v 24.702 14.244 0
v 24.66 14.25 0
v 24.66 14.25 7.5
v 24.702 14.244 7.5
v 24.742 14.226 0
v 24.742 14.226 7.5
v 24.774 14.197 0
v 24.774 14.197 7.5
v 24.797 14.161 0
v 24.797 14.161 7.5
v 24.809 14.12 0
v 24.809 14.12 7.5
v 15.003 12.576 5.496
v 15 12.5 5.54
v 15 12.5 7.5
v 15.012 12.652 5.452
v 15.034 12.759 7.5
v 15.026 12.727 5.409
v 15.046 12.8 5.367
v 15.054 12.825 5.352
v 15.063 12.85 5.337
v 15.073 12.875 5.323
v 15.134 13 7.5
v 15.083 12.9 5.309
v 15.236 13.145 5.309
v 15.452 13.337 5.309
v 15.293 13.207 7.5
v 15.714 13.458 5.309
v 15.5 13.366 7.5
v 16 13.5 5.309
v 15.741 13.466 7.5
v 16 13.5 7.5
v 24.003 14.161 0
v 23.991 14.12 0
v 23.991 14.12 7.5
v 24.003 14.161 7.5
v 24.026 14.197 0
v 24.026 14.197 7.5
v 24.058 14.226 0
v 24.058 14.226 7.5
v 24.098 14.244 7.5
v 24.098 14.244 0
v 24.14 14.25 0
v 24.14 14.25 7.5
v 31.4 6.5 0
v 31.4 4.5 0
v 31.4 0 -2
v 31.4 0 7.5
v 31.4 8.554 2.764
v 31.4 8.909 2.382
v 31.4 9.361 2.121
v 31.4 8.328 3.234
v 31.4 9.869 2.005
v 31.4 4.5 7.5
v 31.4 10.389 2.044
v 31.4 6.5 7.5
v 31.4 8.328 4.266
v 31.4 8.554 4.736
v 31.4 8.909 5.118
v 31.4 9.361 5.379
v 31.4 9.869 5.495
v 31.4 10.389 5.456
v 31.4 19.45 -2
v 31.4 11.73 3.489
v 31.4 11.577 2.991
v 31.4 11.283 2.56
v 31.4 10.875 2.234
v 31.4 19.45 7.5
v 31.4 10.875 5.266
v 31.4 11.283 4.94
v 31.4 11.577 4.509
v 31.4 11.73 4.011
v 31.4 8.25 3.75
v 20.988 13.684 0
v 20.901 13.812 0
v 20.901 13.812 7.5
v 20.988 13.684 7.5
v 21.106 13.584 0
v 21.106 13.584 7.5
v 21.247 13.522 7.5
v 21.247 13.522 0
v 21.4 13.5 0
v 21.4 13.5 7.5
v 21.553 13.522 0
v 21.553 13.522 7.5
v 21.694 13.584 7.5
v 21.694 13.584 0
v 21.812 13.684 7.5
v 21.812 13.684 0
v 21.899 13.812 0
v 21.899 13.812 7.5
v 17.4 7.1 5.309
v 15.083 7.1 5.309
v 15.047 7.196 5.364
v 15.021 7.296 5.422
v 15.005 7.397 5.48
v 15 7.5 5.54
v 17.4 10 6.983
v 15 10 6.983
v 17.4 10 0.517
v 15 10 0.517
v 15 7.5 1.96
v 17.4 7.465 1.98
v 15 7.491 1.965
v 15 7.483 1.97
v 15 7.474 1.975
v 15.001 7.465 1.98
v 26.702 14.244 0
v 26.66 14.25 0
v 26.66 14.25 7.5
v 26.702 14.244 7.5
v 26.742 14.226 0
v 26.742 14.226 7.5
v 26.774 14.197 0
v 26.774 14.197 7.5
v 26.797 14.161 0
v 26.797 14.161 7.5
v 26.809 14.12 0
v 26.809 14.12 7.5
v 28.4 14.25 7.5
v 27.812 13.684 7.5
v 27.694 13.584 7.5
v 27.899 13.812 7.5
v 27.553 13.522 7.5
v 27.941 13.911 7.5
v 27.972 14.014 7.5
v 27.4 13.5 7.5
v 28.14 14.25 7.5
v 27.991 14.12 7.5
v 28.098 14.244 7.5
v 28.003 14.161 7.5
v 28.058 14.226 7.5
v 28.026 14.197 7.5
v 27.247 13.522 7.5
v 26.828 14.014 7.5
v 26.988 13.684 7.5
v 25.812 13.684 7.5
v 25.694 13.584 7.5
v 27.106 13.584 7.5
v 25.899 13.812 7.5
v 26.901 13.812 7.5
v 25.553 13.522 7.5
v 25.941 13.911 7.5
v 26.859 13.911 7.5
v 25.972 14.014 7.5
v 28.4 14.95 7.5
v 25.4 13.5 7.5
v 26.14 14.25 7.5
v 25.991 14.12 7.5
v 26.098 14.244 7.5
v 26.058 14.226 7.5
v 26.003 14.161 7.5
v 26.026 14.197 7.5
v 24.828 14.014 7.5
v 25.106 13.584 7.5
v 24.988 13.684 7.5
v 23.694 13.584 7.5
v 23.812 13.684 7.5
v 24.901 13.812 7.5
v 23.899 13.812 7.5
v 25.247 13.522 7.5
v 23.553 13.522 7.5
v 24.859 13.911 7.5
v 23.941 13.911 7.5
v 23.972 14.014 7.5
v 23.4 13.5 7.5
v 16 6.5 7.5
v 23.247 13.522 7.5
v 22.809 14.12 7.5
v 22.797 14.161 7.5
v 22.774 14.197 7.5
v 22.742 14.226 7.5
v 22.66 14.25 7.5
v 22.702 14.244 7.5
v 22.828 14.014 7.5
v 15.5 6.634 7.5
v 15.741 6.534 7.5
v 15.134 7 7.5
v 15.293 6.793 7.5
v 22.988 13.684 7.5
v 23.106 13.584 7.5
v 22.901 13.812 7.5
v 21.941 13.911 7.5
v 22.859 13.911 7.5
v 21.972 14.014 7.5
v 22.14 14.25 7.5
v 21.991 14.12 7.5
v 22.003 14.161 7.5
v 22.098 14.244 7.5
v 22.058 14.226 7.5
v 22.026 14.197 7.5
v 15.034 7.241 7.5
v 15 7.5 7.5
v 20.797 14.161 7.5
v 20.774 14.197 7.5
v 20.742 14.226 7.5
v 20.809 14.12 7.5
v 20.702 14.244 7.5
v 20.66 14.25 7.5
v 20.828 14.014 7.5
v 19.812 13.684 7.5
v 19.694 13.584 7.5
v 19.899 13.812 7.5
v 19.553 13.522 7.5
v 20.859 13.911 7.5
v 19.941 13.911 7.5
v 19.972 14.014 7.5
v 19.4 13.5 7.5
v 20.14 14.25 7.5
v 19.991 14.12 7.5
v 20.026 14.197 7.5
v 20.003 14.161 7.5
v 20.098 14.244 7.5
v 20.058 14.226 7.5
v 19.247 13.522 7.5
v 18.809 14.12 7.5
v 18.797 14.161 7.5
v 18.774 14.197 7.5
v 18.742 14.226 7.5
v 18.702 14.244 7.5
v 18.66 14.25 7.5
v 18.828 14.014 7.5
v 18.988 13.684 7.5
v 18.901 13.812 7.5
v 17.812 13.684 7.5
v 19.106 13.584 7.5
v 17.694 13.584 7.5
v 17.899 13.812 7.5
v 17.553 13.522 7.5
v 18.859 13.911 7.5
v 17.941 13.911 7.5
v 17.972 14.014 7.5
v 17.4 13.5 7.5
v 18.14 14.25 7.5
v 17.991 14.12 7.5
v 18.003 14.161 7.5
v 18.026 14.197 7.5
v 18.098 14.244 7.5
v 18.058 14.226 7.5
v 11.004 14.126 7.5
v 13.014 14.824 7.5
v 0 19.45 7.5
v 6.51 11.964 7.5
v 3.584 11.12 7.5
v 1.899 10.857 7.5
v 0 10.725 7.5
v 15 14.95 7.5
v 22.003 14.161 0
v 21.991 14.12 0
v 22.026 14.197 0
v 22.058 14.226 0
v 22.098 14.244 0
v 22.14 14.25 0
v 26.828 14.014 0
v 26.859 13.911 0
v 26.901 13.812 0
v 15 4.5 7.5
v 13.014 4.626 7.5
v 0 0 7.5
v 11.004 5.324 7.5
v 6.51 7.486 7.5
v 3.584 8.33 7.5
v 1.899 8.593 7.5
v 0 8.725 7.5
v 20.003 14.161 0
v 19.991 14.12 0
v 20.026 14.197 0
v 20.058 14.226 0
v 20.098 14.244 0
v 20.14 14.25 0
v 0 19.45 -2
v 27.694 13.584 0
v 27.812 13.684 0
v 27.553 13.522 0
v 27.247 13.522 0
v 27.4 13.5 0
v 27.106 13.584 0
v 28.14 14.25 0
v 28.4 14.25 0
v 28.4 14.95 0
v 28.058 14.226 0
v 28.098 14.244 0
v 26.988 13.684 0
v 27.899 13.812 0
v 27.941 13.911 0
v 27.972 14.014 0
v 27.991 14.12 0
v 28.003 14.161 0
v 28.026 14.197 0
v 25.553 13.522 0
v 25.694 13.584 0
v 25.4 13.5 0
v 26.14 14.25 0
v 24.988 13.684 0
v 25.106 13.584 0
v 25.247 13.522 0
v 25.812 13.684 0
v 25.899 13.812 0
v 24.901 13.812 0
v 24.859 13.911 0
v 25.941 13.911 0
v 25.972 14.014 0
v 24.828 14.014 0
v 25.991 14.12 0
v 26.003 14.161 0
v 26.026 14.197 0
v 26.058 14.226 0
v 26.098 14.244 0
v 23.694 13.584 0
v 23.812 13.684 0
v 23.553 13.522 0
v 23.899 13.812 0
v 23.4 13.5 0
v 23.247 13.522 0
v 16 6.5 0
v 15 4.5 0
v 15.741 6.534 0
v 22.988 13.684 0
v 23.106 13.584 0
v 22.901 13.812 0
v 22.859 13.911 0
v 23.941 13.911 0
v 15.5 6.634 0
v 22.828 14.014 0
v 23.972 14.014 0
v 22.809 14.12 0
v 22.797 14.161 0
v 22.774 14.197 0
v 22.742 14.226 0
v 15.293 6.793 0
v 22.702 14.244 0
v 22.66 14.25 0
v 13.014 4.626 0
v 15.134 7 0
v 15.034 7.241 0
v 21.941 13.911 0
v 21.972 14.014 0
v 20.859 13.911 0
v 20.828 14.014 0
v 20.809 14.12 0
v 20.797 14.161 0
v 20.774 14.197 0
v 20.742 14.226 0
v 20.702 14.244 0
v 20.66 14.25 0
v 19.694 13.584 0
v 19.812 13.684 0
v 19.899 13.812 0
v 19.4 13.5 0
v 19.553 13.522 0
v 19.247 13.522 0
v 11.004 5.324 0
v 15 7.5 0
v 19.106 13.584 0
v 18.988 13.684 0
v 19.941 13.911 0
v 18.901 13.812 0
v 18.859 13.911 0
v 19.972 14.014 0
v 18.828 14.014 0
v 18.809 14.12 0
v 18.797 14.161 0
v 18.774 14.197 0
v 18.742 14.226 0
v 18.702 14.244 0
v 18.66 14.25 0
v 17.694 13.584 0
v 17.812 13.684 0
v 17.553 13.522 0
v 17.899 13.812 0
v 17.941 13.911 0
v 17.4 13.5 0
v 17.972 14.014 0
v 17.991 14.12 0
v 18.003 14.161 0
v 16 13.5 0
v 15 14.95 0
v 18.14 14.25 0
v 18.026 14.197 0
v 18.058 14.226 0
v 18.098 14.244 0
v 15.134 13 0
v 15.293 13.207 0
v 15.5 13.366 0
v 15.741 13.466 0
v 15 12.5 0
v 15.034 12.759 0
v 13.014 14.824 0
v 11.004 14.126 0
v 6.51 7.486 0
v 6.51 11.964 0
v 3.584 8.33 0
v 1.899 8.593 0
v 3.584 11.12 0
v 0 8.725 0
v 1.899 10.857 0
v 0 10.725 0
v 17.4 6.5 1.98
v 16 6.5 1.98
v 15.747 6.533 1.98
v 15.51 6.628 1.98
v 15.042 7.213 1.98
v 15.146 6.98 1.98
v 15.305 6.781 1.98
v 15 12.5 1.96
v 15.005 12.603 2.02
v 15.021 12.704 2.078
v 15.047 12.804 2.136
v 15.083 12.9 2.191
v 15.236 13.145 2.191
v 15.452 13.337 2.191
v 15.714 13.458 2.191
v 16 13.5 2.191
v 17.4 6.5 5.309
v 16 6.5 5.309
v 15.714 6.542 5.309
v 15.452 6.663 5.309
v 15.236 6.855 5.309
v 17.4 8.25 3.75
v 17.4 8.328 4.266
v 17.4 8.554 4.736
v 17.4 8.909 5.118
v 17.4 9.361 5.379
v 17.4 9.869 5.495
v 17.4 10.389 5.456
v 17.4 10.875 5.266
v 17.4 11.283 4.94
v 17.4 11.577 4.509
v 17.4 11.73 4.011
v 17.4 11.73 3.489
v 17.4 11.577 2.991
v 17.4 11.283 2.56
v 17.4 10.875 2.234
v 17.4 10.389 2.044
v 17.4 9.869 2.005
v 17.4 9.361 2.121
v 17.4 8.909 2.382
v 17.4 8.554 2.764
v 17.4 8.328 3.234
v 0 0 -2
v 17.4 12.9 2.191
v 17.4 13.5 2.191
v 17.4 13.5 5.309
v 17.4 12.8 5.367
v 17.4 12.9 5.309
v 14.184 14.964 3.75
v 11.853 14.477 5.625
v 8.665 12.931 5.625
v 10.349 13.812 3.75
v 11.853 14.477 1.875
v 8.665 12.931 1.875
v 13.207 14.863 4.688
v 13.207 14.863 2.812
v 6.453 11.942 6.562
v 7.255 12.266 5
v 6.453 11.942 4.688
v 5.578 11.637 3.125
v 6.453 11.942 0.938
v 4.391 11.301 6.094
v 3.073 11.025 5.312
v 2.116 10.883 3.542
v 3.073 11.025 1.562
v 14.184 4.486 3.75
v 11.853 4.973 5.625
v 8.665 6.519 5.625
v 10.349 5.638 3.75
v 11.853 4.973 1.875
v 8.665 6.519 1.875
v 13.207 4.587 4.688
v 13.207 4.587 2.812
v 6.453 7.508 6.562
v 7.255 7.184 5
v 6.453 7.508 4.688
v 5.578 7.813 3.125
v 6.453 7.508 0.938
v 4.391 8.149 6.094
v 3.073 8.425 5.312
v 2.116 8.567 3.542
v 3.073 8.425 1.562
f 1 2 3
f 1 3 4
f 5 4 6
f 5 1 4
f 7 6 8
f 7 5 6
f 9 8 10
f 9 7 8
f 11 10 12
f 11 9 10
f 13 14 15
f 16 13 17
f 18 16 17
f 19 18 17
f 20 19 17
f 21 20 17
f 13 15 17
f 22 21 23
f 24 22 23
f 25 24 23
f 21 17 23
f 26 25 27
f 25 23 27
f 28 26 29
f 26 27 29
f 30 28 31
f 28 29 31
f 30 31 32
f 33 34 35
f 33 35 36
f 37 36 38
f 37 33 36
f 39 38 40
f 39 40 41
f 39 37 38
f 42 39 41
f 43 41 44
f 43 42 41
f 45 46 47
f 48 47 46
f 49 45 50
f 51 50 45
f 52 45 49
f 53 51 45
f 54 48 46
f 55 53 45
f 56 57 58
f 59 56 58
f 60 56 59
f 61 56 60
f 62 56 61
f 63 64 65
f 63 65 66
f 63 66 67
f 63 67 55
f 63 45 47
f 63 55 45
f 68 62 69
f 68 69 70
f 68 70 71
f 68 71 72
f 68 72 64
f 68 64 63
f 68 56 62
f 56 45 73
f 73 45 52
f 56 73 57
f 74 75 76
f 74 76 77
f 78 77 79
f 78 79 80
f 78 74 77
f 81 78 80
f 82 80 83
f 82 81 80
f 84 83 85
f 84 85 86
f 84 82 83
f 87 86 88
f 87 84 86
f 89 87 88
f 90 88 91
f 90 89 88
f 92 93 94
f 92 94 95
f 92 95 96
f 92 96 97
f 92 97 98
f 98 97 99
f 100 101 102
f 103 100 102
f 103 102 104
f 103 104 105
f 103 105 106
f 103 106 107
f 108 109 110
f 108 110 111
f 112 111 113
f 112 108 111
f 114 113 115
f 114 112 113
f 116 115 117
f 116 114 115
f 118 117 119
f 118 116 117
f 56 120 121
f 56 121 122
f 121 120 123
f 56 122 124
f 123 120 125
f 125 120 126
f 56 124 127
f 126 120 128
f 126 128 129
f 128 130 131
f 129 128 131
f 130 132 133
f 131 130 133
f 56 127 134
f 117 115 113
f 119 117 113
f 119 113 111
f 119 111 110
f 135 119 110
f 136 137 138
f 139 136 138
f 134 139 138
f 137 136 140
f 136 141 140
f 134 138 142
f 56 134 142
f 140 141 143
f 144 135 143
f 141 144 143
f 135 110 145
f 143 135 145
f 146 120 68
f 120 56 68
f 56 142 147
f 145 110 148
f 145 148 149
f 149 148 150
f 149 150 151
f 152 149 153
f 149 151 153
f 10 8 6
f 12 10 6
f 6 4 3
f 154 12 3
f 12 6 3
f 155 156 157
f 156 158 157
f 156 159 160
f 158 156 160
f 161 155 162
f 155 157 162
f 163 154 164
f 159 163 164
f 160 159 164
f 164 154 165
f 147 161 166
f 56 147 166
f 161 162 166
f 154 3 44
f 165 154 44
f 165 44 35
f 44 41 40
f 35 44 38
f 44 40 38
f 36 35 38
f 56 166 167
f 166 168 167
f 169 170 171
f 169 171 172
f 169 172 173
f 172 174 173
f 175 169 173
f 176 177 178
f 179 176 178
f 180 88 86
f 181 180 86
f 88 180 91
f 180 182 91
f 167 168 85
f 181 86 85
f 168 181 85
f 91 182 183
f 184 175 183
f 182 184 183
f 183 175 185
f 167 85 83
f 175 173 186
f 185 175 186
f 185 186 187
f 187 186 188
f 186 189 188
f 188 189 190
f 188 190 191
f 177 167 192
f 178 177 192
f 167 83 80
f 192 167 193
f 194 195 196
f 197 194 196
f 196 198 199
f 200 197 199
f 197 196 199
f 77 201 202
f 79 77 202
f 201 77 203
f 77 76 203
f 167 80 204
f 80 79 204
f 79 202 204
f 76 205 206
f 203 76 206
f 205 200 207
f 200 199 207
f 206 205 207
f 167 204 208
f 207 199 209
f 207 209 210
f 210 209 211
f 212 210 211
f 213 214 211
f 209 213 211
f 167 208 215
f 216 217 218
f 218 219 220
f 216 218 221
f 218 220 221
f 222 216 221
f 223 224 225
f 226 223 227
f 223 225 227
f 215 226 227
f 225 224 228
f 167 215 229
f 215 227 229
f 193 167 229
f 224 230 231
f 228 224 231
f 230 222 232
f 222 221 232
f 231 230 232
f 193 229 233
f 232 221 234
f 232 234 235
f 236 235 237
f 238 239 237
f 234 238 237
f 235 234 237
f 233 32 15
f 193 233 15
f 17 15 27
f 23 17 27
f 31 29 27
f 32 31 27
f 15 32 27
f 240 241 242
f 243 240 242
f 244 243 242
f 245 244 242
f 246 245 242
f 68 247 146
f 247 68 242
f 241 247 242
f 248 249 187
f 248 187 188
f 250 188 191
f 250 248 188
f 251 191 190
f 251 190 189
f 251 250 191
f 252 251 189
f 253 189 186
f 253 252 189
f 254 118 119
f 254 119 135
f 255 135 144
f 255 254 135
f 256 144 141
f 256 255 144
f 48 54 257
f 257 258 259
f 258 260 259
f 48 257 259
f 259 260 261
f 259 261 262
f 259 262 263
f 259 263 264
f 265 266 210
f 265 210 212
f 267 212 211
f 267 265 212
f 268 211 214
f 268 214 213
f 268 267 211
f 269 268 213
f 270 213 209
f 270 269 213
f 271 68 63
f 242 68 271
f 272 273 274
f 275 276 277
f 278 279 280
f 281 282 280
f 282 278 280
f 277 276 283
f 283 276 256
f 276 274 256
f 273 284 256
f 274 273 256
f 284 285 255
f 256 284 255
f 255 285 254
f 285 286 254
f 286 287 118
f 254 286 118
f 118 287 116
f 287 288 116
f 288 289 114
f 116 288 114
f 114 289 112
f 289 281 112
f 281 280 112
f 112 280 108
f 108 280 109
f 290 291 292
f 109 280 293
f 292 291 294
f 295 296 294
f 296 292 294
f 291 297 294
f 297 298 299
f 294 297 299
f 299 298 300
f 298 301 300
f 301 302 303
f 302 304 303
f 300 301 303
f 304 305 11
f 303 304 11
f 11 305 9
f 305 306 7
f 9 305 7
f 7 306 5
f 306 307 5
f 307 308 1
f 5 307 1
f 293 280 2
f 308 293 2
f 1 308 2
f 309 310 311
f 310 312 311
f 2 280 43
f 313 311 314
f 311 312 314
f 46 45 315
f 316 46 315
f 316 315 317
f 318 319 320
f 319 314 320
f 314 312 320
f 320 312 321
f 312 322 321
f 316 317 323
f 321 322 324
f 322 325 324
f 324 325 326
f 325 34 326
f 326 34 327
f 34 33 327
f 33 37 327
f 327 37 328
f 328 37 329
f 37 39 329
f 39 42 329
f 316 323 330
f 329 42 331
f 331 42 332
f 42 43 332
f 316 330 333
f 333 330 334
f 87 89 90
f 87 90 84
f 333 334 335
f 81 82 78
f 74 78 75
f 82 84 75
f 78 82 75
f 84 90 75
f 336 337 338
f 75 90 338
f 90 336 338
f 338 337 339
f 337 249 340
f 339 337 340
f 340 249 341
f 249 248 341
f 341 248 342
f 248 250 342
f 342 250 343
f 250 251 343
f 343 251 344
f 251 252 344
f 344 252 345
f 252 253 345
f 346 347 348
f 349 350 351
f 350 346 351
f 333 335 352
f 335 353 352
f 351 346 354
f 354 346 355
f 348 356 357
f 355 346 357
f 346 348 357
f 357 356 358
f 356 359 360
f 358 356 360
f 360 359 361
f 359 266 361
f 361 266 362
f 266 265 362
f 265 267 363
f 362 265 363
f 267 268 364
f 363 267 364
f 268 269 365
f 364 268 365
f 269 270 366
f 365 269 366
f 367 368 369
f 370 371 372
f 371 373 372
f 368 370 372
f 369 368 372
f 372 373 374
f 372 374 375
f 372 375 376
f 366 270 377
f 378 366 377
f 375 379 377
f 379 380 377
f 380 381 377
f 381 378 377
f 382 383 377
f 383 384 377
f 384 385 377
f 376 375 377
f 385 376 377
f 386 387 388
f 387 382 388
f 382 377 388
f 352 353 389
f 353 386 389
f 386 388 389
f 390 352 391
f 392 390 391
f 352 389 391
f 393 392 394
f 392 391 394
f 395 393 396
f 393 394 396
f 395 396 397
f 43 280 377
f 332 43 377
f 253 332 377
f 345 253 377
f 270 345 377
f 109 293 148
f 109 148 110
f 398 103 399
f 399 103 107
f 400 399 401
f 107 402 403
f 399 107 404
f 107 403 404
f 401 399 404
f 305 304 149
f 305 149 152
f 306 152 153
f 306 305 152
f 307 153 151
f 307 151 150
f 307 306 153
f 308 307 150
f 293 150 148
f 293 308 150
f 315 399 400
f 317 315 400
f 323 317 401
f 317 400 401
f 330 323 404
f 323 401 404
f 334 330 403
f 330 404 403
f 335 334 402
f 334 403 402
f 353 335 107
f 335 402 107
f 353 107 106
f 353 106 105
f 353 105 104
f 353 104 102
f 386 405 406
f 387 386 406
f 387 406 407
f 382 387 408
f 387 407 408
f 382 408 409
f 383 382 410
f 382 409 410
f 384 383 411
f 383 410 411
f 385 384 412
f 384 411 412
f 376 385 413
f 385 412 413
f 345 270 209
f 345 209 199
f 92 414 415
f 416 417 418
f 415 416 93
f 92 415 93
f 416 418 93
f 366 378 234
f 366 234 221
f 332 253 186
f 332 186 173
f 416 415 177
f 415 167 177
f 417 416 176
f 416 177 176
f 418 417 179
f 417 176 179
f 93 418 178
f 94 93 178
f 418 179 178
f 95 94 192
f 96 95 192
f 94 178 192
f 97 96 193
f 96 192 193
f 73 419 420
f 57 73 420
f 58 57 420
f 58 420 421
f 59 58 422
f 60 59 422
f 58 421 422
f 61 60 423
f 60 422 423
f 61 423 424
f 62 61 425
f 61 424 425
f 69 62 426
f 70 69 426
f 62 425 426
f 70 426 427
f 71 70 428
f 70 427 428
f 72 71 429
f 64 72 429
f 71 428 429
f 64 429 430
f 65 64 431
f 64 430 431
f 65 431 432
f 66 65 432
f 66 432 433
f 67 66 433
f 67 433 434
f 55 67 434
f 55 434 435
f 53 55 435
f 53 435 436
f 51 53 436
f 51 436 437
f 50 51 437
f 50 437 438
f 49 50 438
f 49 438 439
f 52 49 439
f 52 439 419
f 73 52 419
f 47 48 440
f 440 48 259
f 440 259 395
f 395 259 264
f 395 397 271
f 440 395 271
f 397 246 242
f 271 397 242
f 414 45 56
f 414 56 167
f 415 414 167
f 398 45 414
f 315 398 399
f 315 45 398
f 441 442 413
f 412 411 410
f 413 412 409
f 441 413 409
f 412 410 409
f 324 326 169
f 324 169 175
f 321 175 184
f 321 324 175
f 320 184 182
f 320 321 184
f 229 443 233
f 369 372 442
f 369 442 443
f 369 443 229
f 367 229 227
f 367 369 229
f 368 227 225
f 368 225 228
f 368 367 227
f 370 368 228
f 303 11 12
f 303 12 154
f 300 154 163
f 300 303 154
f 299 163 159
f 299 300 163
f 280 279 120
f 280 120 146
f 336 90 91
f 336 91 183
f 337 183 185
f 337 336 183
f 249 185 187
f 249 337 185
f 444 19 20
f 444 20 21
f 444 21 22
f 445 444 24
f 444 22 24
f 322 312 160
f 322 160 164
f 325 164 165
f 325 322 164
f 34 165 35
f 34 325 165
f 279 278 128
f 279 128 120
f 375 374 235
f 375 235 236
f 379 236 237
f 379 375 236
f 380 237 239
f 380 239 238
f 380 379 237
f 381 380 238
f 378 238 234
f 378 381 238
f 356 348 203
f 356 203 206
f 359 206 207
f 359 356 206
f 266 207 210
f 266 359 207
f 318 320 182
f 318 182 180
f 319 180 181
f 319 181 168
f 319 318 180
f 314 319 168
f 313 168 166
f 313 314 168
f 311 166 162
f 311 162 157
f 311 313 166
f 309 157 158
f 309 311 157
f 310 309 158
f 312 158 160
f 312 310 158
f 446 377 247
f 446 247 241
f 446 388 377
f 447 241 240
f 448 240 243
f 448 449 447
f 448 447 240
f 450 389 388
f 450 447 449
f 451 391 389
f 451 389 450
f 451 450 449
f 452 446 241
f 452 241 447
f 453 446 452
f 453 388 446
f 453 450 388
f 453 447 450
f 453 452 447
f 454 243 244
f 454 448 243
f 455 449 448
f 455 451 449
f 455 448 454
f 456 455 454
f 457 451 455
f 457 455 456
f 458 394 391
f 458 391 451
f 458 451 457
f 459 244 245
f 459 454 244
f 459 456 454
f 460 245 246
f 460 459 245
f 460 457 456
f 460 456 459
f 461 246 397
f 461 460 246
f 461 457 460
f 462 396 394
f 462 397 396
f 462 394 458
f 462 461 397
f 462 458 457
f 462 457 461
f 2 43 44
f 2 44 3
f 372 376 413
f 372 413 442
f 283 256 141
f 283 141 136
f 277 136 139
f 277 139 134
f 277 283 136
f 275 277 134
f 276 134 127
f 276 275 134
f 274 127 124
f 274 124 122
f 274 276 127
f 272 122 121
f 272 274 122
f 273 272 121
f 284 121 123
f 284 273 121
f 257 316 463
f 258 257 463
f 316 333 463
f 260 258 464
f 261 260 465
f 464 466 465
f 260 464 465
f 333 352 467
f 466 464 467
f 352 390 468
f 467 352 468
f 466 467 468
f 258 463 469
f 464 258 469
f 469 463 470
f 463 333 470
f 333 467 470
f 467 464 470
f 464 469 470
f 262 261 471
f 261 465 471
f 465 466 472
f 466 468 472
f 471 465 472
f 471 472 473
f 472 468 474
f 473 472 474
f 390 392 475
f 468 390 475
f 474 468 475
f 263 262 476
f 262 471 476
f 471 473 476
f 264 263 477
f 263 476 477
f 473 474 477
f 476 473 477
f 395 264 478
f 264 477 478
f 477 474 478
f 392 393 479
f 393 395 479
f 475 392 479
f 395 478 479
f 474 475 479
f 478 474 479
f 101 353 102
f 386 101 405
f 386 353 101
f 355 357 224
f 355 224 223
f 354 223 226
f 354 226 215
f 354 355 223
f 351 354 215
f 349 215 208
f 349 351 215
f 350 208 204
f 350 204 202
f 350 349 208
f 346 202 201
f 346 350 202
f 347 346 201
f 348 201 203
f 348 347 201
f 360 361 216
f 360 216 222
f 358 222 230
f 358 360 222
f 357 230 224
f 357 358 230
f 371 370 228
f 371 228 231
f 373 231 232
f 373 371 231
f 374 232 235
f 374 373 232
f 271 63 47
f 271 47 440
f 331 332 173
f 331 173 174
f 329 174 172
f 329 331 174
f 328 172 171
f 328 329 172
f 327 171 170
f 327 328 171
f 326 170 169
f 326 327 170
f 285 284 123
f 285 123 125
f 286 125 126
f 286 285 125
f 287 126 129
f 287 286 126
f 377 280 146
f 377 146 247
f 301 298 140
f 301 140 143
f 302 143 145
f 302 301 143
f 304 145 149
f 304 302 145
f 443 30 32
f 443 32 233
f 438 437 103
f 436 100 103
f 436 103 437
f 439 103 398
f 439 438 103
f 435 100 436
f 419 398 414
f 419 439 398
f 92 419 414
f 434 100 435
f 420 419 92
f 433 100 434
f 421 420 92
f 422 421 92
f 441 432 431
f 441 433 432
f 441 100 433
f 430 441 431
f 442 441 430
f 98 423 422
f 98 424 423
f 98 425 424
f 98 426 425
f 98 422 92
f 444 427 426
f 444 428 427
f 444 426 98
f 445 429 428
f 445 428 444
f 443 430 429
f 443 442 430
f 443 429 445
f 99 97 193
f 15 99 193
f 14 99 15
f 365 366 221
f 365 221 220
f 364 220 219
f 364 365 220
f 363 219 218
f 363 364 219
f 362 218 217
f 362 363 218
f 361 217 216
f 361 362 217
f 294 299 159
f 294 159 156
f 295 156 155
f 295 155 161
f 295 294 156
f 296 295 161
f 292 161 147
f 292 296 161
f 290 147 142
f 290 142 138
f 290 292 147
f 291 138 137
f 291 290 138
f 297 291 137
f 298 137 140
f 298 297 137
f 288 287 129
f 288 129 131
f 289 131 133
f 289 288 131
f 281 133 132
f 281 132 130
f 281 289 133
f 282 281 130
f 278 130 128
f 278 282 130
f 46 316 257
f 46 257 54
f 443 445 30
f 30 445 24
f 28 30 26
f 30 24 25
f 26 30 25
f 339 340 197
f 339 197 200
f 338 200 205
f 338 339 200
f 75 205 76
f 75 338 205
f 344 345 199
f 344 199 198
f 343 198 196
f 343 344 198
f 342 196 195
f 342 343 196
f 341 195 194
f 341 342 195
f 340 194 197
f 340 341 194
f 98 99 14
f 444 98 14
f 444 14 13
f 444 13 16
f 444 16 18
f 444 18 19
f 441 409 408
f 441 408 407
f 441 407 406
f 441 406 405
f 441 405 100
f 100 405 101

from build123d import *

# Parameters (mm, degrees)
ESTRUSIONE_ESTRUSIONE1_DEPTH   = 7.5
ESTRUSIONE_ESTRUSIONE1_2_DEPTH = 7.5
SCHIZZO2_W                     = 31.4
SCHIZZO2_H                     = 19.45
ESTRUSIONE_ESTRUSIONE2_DEPTH   = 2
TAGLIO_ESTRUSIONE3_DEPTH       = 2.4
SCHIZZO5_3_R                   = 1.75
TAGLIO_ESTRUSIONE4_DEPTH       = 27.523810222
RACCORDO1_R                    = 1


with BuildPart() as part:
    # Schizzo1 → Estrusione-Estrusione1 (new body)
    with BuildSketch(Plane.XY):
        with BuildLine():
            Line((31.4, 6.5), (31.4, 19.45))
            Line((31.4, 19.45), (0, 19.45))
            Line((0, 19.45), (0, 10.725))
            add(Edge.make_bspline(
                [(15, 14.95), (14.198625643, 14.95), (12.206107526, 15.352992529), (5.436685448, 10.879393873), (0, 10.725)],
                knots=[0, 0, 0, 0, 0.57277107, 1, 1, 1, 1], degree=3))
            Line((15, 14.95), (28.4, 14.95))
            Line((28.4, 14.95), (28.4, 14.25))
            Line((28.4, 14.25), (28.140175425, 14.25))
            ThreePointArc((28.140175425, 14.25), (28.041268354, 14.212771412), (27.991456891, 14.119565217))
            ThreePointArc((27.991456891, 14.119565217), (27.957611714, 13.961937846), (27.898876404, 13.811797753))
            ThreePointArc((27.898876404, 13.811797753), (27.4, 13.5), (26.901123596, 13.811797753))
            ThreePointArc((26.901123596, 13.811797753), (26.842388286, 13.961937846), (26.808543109, 14.119565217))
            ThreePointArc((26.808543109, 14.119565217), (26.758731646, 14.212771412), (26.659824575, 14.25))
            Line((26.659824575, 14.25), (26.140175425, 14.25))
            ThreePointArc((26.140175425, 14.25), (26.041268354, 14.212771412), (25.991456891, 14.119565217))
            ThreePointArc((25.991456891, 14.119565217), (25.957611714, 13.961937846), (25.898876404, 13.811797753))
            ThreePointArc((25.898876404, 13.811797753), (25.4, 13.5), (24.901123596, 13.811797753))
            ThreePointArc((24.901123596, 13.811797753), (24.842388286, 13.961937846), (24.808543109, 14.119565217))
            ThreePointArc((24.808543109, 14.119565217), (24.758731646, 14.212771412), (24.659824575, 14.25))
            Line((24.659824575, 14.25), (24.140175425, 14.25))
            ThreePointArc((24.140175425, 14.25), (24.041268354, 14.212771412), (23.991456891, 14.119565217))
            ThreePointArc((23.991456891, 14.119565217), (23.957611714, 13.961937846), (23.898876404, 13.811797753))
            ThreePointArc((23.898876404, 13.811797753), (23.4, 13.5), (22.901123596, 13.811797753))
            ThreePointArc((22.901123596, 13.811797753), (22.842388286, 13.961937846), (22.808543109, 14.119565217))
            ThreePointArc((22.808543109, 14.119565217), (22.758731646, 14.212771412), (22.659824575, 14.25))
            Line((22.659824575, 14.25), (22.140175425, 14.25))
            ThreePointArc((22.140175425, 14.25), (22.041268354, 14.212771412), (21.991456891, 14.119565217))
            ThreePointArc((21.991456891, 14.119565217), (21.957611714, 13.961937846), (21.898876404, 13.811797753))
            ThreePointArc((21.898876404, 13.811797753), (21.4, 13.5), (20.901123596, 13.811797753))
            ThreePointArc((20.901123596, 13.811797753), (20.842388286, 13.961937846), (20.808543109, 14.119565217))
            ThreePointArc((20.808543109, 14.119565217), (20.758731646, 14.212771412), (20.659824575, 14.25))
            Line((20.659824575, 14.25), (20.140175425, 14.25))
            ThreePointArc((20.140175425, 14.25), (20.041268354, 14.212771412), (19.991456891, 14.119565217))
            ThreePointArc((19.991456891, 14.119565217), (19.957611714, 13.961937846), (19.898876404, 13.811797753))
            ThreePointArc((19.898876404, 13.811797753), (19.4, 13.5), (18.901123596, 13.811797753))
            ThreePointArc((18.901123596, 13.811797753), (18.842388286, 13.961937846), (18.808543109, 14.119565217))
            ThreePointArc((18.808543109, 14.119565217), (18.758731646, 14.212771412), (18.659824575, 14.25))
            Line((18.659824575, 14.25), (18.140175425, 14.25))
            ThreePointArc((18.140175425, 14.25), (18.041268354, 14.212771412), (17.991456891, 14.119565217))
            ThreePointArc((17.991456891, 14.119565217), (17.957611714, 13.961937846), (17.898876404, 13.811797753))
            ThreePointArc((17.898876404, 13.811797753), (17.694149412, 13.584360941), (17.4, 13.5))
            Line((17.4, 13.5), (15, 13.5))
            Line((15, 13.5), (15, 6.5))
            Line((15, 6.5), (31.4, 6.5))
        make_face()
    extrude(amount=ESTRUSIONE_ESTRUSIONE1_DEPTH)



with BuildPart() as body_2:
    # Schizzo1 → Estrusione-Estrusione1 2 (new body)
    with BuildSketch(Plane.XY):
        with BuildLine():
            Line((31.4, 0), (31.4, 4.5))
            Line((31.4, 4.5), (15, 4.5))
            add(Edge.make_bspline(
                [(15, 4.5), (14.198625643, 4.5), (12.206107526, 4.097007471), (5.436685448, 8.570606127), (0, 8.725)],
                knots=[0, 0, 0, 0, 0.57277107, 1, 1, 1, 1], degree=3))
            Line((0, 8.725), (0, 0))
            Line((0, 0), (31.4, 0))
        make_face()
    extrude(amount=ESTRUSIONE_ESTRUSIONE1_2_DEPTH)


with BuildPart() as part_1:
    add(part.part)

    add(body_2.part)  # Estrusione-Estrusione2 merges body 2
    # Schizzo2 → Estrusione-Estrusione2 (add)
    with BuildSketch(Plane(origin=(0, 0, 0), x_dir=(-1, 0, 0), z_dir=(0, 0, -1))):
        with Locations((-15.7, 9.725)):
            Rectangle(SCHIZZO2_W, SCHIZZO2_H)
    extrude(amount=ESTRUSIONE_ESTRUSIONE2_DEPTH)

    # Schizzo5 → Taglio-Estrusione3 (cut)
    with BuildSketch(Plane.ZY.offset(-15)):
        Polygon((5.308845727, 7.1), (6.983161507, 10), (5.366580754, 12.8), (5.308845727, 12.9), (5.308845727, 13.5), (2.191154273, 13.5), (2.191154273, 12.9), (0.516838493, 10), (1.980206835, 7.46537168), (1.980206835, 7.2), (1.980206835, 6.5), (5.308845727, 6.5), align=None)
    extrude(amount=-TAGLIO_ESTRUSIONE3_DEPTH, mode=Mode.SUBTRACT)

    # Schizzo5<3> → Taglio-Estrusione4 (cut, through all)
    with BuildSketch(Plane.ZY.offset(-15)):
        with Locations((3.75, 10)):
            Circle(SCHIZZO5_3_R)
    extrude(amount=-TAGLIO_ESTRUSIONE4_DEPTH, mode=Mode.SUBTRACT)

    # Raccordo1
    raccordo1_edges = [part_1.edges().sort_by_distance(p)[0] for p in [
        (15, 13.5, 6.404422863),
        (15, 13.5, 1.095577137),
        (15, 6.5, 0.990103418),
        (15, 6.5, 6.404422863),
    ]]
    fillet(raccordo1_edges, radius=RACCORDO1_R)


solid = part_1.part
